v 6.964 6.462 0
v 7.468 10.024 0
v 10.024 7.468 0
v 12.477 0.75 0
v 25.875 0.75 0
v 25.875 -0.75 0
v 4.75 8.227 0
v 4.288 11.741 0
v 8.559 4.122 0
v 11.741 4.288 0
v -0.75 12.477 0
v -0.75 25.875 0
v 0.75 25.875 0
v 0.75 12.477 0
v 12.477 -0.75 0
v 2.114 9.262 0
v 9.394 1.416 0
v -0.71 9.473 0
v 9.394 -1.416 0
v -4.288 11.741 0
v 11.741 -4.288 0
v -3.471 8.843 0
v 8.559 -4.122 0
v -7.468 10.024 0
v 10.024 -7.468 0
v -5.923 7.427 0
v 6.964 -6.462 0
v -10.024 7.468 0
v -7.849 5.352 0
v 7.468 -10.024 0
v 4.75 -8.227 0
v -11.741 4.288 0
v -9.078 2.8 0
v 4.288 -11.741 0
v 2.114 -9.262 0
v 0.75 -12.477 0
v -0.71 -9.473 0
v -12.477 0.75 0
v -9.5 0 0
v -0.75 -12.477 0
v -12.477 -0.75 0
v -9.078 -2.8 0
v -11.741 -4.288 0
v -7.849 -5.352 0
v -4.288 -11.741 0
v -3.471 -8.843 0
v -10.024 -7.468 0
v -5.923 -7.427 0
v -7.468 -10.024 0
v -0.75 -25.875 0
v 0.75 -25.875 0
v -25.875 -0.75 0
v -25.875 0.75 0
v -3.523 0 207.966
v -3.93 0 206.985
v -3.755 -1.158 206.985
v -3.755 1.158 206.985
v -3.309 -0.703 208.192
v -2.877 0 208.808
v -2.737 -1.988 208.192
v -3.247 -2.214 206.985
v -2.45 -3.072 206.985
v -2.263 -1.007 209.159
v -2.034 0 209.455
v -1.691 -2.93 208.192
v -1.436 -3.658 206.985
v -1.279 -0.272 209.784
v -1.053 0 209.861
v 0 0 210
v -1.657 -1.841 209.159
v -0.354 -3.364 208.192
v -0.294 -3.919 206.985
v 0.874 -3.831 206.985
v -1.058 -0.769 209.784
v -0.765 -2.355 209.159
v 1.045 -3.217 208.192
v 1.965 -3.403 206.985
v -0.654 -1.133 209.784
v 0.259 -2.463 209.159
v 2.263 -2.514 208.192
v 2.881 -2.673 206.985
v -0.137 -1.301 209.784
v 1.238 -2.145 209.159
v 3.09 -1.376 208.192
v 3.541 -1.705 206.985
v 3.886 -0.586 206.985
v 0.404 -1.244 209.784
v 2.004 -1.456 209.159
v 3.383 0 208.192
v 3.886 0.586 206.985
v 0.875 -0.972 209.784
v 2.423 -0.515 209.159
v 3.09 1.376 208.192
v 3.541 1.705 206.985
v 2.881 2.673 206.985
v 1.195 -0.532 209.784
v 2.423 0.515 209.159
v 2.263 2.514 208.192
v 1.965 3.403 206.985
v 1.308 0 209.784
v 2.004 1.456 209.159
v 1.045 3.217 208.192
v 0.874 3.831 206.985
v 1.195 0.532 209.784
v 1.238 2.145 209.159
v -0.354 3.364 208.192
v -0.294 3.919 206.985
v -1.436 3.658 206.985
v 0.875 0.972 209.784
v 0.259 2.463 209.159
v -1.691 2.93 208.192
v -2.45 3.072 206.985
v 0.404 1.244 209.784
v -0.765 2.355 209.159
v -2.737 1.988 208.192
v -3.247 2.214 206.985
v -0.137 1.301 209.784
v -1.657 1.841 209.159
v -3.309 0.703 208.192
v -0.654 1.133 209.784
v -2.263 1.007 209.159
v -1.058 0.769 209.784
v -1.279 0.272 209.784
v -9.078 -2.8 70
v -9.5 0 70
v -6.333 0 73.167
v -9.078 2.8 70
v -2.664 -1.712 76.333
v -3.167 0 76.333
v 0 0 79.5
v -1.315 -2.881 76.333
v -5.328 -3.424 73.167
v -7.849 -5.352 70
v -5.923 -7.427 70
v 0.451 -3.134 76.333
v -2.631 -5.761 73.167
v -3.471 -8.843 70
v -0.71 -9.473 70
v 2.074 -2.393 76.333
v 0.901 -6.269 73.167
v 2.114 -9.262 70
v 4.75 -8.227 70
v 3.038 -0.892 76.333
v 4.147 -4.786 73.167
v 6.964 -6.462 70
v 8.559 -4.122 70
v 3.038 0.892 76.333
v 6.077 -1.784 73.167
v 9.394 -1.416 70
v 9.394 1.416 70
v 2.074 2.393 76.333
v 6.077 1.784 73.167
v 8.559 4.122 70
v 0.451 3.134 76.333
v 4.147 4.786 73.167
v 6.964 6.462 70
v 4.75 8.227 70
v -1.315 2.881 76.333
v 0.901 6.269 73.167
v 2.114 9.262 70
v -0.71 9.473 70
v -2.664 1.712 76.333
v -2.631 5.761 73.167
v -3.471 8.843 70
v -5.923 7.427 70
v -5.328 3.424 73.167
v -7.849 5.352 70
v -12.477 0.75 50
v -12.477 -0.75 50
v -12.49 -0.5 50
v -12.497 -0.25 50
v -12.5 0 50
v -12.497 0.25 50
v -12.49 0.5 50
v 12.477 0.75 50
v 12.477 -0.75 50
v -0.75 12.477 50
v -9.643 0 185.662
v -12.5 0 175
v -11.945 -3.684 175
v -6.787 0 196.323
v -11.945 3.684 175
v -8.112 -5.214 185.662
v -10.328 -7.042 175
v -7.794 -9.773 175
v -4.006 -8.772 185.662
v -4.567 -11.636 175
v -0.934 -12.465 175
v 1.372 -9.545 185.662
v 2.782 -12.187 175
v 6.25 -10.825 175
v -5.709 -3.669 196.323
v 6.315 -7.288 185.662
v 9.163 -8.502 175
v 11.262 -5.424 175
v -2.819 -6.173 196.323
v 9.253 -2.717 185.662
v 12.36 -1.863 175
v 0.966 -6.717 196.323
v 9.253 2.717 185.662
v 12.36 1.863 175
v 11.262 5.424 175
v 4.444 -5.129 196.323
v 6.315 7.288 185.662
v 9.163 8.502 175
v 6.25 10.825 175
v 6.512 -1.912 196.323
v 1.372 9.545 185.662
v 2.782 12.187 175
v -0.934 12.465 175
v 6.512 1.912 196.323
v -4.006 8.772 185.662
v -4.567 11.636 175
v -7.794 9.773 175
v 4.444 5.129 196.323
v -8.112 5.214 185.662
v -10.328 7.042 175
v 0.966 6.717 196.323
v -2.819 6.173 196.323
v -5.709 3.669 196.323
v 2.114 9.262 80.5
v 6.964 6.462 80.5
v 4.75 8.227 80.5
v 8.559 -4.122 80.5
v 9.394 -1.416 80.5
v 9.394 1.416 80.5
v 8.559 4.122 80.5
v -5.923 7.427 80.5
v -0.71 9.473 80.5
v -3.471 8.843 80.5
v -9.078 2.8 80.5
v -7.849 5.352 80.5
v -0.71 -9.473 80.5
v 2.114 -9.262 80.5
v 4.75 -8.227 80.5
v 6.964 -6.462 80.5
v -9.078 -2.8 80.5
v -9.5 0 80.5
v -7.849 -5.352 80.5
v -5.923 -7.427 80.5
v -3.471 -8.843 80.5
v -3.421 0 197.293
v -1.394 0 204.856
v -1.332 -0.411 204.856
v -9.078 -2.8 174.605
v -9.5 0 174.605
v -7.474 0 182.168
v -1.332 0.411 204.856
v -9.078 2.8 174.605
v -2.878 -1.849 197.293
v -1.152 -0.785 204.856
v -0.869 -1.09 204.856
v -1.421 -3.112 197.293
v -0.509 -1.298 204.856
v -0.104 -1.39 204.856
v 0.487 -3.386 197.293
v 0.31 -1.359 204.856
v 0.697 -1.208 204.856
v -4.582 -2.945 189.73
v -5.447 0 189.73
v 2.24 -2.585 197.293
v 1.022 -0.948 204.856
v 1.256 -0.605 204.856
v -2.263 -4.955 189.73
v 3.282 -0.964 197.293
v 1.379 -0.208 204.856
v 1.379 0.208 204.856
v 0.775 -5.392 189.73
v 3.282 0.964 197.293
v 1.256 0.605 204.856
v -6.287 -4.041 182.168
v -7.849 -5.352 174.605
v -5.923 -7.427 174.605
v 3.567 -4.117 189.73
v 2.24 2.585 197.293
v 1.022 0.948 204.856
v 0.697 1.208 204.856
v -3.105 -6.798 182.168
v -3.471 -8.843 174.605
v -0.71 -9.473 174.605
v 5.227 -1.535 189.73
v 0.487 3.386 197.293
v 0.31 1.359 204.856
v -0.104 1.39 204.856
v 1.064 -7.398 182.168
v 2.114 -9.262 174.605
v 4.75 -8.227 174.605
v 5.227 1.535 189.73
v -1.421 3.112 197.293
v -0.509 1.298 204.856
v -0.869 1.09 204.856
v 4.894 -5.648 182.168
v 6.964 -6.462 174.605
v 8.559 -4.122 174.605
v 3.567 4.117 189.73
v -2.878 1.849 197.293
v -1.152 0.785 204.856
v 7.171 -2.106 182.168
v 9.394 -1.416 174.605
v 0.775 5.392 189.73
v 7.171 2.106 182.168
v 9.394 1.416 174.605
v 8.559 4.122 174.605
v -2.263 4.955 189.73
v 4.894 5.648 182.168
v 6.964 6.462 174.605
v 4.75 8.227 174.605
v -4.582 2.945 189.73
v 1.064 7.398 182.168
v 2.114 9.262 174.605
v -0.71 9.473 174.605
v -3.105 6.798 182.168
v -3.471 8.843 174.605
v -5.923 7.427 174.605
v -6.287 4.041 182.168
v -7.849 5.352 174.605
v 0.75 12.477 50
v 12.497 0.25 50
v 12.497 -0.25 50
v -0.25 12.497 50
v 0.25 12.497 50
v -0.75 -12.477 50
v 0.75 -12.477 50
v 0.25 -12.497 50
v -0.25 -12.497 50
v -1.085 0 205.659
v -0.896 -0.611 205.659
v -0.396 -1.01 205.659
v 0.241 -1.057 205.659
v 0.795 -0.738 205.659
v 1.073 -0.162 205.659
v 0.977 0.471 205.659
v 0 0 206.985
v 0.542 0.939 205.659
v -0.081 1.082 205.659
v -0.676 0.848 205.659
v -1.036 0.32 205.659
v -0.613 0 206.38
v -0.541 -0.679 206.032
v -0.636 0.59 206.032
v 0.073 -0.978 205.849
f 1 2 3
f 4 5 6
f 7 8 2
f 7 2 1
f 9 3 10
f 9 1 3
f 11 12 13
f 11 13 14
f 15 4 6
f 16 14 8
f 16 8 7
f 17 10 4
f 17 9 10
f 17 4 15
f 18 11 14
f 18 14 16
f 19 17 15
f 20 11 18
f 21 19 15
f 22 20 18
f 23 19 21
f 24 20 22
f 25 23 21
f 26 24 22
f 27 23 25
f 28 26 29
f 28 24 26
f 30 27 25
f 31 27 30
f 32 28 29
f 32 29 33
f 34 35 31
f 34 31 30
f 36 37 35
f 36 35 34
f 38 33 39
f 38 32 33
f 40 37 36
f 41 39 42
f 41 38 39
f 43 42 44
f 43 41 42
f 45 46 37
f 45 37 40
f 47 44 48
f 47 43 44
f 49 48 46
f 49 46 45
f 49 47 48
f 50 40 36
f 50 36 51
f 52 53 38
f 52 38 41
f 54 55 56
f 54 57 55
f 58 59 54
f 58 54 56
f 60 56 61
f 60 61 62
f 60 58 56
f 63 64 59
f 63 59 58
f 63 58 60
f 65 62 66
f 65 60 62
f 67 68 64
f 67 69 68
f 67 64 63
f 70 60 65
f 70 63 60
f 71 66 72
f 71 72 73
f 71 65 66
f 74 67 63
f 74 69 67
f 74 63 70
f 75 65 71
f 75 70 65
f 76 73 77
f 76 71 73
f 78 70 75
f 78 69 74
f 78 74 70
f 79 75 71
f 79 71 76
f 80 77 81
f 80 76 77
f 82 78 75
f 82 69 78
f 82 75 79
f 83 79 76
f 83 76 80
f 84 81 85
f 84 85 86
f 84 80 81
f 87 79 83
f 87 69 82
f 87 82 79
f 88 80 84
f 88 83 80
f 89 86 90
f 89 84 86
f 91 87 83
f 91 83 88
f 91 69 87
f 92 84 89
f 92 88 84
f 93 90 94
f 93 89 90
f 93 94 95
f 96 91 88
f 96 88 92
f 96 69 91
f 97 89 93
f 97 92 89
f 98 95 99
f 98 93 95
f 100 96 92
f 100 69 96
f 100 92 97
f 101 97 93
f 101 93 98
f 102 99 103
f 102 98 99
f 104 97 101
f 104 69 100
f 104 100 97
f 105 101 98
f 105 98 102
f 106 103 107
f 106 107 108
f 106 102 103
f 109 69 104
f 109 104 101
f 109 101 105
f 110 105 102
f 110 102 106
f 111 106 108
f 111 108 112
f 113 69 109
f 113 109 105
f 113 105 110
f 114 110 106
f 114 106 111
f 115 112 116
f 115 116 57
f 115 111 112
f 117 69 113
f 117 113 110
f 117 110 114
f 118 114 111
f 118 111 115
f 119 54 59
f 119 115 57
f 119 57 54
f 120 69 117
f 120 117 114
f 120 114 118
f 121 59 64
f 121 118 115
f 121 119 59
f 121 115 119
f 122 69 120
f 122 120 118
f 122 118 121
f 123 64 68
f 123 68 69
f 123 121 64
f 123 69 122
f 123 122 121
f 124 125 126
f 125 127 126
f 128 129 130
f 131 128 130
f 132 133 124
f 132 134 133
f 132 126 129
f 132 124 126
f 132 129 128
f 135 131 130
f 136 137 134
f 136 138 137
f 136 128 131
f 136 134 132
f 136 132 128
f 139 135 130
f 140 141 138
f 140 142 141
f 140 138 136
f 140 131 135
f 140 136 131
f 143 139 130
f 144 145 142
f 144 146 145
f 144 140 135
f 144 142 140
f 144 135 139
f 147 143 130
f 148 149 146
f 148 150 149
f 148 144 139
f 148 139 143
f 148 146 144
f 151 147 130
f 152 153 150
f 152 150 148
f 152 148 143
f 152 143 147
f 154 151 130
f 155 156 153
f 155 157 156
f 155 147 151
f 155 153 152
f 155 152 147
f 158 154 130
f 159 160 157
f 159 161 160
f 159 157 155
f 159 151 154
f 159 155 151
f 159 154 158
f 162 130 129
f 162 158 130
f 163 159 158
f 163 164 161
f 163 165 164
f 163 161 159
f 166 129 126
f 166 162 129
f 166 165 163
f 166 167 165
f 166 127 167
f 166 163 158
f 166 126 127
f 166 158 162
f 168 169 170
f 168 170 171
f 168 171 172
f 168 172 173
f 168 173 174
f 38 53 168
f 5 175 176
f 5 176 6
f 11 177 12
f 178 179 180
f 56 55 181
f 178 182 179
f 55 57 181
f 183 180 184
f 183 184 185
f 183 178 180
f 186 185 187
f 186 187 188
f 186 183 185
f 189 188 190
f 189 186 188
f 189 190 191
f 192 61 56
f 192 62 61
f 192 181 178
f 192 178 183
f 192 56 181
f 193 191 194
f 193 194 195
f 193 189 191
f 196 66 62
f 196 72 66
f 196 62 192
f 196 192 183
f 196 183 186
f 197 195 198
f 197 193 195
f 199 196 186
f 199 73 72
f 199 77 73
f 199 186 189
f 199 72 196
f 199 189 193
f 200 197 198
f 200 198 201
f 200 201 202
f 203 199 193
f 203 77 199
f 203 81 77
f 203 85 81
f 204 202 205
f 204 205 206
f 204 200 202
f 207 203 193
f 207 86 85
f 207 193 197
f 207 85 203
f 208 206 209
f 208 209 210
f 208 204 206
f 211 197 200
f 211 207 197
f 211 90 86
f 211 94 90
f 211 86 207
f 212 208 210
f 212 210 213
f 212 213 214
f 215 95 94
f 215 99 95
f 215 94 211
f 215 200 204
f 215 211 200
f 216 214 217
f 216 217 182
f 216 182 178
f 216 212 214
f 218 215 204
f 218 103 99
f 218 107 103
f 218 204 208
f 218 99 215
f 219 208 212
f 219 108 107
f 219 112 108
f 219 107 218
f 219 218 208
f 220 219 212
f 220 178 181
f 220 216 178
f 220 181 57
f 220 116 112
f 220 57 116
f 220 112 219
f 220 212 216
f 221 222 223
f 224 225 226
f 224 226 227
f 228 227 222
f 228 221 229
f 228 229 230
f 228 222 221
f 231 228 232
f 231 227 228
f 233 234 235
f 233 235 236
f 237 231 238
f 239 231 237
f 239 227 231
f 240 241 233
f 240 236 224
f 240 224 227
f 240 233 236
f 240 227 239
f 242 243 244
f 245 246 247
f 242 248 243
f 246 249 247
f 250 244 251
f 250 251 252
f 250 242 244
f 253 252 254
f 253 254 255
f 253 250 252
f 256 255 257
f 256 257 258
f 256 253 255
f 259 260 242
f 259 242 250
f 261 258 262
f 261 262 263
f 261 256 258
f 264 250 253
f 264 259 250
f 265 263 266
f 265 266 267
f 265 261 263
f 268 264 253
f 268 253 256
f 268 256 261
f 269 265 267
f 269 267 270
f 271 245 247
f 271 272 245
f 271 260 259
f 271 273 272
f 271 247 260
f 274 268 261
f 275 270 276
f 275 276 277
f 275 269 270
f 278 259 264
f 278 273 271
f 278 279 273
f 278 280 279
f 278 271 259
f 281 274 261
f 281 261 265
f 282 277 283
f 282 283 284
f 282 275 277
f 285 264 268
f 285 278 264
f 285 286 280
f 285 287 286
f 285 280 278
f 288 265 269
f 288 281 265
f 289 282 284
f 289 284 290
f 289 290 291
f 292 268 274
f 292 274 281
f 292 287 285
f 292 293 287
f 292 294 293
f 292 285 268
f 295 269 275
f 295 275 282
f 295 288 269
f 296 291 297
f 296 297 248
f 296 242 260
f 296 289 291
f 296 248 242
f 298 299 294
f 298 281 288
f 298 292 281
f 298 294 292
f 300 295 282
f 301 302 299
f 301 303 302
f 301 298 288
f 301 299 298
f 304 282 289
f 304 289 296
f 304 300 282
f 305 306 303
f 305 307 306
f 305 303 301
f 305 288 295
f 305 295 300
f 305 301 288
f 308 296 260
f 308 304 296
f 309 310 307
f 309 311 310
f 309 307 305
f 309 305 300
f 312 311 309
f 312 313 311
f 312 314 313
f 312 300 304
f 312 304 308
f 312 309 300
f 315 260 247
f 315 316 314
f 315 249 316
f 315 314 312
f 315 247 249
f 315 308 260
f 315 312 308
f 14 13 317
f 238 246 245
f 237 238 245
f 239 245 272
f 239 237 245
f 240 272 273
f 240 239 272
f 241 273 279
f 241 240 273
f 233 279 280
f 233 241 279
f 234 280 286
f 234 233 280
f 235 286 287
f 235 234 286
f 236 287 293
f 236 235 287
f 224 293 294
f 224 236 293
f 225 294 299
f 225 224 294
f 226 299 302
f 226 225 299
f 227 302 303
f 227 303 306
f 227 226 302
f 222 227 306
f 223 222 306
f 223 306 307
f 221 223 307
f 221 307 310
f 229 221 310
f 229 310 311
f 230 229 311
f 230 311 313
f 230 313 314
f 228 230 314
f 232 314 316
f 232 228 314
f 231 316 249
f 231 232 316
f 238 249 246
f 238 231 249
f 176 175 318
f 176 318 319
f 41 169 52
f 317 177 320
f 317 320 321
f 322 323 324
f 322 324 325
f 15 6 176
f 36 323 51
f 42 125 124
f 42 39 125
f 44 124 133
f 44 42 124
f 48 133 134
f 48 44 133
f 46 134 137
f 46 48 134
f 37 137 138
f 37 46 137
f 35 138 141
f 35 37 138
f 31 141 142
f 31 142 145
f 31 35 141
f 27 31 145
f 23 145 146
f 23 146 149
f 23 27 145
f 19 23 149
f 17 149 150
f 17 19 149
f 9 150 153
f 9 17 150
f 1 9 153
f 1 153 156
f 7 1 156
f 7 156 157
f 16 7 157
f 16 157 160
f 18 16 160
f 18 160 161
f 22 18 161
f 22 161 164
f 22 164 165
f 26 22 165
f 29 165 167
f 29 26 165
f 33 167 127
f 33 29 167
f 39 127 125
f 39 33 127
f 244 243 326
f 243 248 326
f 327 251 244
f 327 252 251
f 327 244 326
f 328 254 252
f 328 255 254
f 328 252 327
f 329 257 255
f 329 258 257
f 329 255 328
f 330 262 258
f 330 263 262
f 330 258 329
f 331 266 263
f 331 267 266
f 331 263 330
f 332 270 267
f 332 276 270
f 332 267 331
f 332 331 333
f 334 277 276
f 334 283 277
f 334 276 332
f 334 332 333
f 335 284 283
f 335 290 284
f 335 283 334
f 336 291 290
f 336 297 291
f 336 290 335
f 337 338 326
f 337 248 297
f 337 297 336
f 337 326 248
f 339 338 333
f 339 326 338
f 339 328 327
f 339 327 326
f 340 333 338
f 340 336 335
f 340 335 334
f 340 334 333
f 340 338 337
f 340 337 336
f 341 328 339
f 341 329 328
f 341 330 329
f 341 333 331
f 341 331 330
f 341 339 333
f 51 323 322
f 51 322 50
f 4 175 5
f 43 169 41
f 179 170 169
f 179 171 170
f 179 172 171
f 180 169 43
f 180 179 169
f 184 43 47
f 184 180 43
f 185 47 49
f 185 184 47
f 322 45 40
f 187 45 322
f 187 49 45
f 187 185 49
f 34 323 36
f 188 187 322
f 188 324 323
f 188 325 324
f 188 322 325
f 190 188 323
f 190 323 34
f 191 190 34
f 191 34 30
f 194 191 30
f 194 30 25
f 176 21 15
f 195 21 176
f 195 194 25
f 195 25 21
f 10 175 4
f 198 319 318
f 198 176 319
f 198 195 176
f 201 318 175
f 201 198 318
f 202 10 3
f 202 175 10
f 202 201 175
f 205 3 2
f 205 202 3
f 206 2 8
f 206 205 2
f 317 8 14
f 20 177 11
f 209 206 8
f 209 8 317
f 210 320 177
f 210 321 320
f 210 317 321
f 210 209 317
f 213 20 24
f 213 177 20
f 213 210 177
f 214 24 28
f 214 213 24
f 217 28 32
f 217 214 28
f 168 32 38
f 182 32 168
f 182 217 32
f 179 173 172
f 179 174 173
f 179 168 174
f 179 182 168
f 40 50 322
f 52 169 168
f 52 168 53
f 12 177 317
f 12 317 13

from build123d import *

# Parameters (mm, degrees)
BOSS_EXTRUDE4_REACH      = 217.236
BOSS_EXTRUDE4_END_RADIUS = 12.5
CUT_EXTRUDE1_REACH       = 214.99
CIRPATTERN9_COUNT        = 4


with BuildPart() as part:
    # Sketch1 → Revolve1 (revolve)
    with BuildSketch(Plane.YZ, mode=Mode.PRIVATE) as revolve1_sk:
        with BuildLine():
            Line((-9.5, 0), (-12.5, 0))
            Line((-12.5, 0), (-12.5, 175))
            Line((-12.5, 175), (-3.929753934, 206.98459375))
            ThreePointArc((-3.929753934, 206.98459375), (-2.476673214, 209.15928273), (0, 210))
            Line((0, 210), (0, 206.98459375))
            ThreePointArc((0, 206.98459375), (-0.867879193, 206.03204615), (-1.394318866, 204.855856328))
            Line((-1.394318866, 204.855856328), (-9.5, 174.605042507))
            Line((-9.5, 174.605042507), (-9.5, 80.5))
            Line((-9.5, 80.5), (0, 80.5))
            Line((0, 80.5), (0, 79.5))
            Line((0, 79.5), (-9.5, 70))
            Line((-9.5, 70), (-9.5, 0))
        make_face()
    revolve(revolve1_sk.sketch.rotate(Axis((0, 0, 0), (0, 0, 1)), 270), axis=Axis((0, 0, 0), (0, 0, 1)))

    # Boss-Extrude4: up to this cylinder (the profile starts outside it)
    boss_extrude4_end = Plane(origin=(0, 0, 25), z_dir=(0, 0, -1)) * Cylinder(BOSS_EXTRUDE4_END_RADIUS, 460.472, mode=Mode.PRIVATE)
    # Sketch5 → Boss-Extrude4 (add, up to the surface)
    with BuildSketch(Plane.YZ.offset(33), mode=Mode.PRIVATE) as boss_extrude4_sk1:
        Polygon((0, 0), (-0.75, 0), (-0.75, 50), (0.75, 50), (0.75, 0), align=None)
    boss_extrude4_tool1 = extrude(boss_extrude4_sk1.sketch, amount=-BOSS_EXTRUDE4_REACH, mode=Mode.PRIVATE) - boss_extrude4_end
    boss_extrude4 = boss_extrude4_tool1.solids().sort_by_distance((33, 0, 25))[0]
    add(boss_extrude4)

    # Sketch6 → Cut-Extrude1 (cut, up to next)
    with BuildSketch(Plane(origin=(0, 0.75, 0), x_dir=(-1, 0, 0), z_dir=(0, 1, 0)), mode=Mode.PRIVATE) as cut_extrude1_sk1:
        Polygon((-12.477479713, 50), (-25.874939335, 0), (-33, 0), (-33, 50), align=None)
    cut_extrude1_tool1 = extrude(cut_extrude1_sk1.sketch, amount=-CUT_EXTRUDE1_REACH, mode=Mode.PRIVATE) & part.part
    cut_extrude1 = cut_extrude1_tool1.solids().sort_by_distance((25.547093, 0.75, 29.038165))[0]
    add(cut_extrude1, mode=Mode.SUBTRACT)

    # CirPattern9: Boss-Extrude4, Cut-Extrude1 ×4 about axis
    cirpattern9_axis = Axis((0, 0, 0), (0, 0, 1))
    add([boss_extrude4.rotate(cirpattern9_axis, i * 360 / CIRPATTERN9_COUNT) for i in range(1, CIRPATTERN9_COUNT)])
    add([cut_extrude1.rotate(cirpattern9_axis, i * 360 / CIRPATTERN9_COUNT) for i in range(1, CIRPATTERN9_COUNT)], mode=Mode.SUBTRACT)


solid = part.part
